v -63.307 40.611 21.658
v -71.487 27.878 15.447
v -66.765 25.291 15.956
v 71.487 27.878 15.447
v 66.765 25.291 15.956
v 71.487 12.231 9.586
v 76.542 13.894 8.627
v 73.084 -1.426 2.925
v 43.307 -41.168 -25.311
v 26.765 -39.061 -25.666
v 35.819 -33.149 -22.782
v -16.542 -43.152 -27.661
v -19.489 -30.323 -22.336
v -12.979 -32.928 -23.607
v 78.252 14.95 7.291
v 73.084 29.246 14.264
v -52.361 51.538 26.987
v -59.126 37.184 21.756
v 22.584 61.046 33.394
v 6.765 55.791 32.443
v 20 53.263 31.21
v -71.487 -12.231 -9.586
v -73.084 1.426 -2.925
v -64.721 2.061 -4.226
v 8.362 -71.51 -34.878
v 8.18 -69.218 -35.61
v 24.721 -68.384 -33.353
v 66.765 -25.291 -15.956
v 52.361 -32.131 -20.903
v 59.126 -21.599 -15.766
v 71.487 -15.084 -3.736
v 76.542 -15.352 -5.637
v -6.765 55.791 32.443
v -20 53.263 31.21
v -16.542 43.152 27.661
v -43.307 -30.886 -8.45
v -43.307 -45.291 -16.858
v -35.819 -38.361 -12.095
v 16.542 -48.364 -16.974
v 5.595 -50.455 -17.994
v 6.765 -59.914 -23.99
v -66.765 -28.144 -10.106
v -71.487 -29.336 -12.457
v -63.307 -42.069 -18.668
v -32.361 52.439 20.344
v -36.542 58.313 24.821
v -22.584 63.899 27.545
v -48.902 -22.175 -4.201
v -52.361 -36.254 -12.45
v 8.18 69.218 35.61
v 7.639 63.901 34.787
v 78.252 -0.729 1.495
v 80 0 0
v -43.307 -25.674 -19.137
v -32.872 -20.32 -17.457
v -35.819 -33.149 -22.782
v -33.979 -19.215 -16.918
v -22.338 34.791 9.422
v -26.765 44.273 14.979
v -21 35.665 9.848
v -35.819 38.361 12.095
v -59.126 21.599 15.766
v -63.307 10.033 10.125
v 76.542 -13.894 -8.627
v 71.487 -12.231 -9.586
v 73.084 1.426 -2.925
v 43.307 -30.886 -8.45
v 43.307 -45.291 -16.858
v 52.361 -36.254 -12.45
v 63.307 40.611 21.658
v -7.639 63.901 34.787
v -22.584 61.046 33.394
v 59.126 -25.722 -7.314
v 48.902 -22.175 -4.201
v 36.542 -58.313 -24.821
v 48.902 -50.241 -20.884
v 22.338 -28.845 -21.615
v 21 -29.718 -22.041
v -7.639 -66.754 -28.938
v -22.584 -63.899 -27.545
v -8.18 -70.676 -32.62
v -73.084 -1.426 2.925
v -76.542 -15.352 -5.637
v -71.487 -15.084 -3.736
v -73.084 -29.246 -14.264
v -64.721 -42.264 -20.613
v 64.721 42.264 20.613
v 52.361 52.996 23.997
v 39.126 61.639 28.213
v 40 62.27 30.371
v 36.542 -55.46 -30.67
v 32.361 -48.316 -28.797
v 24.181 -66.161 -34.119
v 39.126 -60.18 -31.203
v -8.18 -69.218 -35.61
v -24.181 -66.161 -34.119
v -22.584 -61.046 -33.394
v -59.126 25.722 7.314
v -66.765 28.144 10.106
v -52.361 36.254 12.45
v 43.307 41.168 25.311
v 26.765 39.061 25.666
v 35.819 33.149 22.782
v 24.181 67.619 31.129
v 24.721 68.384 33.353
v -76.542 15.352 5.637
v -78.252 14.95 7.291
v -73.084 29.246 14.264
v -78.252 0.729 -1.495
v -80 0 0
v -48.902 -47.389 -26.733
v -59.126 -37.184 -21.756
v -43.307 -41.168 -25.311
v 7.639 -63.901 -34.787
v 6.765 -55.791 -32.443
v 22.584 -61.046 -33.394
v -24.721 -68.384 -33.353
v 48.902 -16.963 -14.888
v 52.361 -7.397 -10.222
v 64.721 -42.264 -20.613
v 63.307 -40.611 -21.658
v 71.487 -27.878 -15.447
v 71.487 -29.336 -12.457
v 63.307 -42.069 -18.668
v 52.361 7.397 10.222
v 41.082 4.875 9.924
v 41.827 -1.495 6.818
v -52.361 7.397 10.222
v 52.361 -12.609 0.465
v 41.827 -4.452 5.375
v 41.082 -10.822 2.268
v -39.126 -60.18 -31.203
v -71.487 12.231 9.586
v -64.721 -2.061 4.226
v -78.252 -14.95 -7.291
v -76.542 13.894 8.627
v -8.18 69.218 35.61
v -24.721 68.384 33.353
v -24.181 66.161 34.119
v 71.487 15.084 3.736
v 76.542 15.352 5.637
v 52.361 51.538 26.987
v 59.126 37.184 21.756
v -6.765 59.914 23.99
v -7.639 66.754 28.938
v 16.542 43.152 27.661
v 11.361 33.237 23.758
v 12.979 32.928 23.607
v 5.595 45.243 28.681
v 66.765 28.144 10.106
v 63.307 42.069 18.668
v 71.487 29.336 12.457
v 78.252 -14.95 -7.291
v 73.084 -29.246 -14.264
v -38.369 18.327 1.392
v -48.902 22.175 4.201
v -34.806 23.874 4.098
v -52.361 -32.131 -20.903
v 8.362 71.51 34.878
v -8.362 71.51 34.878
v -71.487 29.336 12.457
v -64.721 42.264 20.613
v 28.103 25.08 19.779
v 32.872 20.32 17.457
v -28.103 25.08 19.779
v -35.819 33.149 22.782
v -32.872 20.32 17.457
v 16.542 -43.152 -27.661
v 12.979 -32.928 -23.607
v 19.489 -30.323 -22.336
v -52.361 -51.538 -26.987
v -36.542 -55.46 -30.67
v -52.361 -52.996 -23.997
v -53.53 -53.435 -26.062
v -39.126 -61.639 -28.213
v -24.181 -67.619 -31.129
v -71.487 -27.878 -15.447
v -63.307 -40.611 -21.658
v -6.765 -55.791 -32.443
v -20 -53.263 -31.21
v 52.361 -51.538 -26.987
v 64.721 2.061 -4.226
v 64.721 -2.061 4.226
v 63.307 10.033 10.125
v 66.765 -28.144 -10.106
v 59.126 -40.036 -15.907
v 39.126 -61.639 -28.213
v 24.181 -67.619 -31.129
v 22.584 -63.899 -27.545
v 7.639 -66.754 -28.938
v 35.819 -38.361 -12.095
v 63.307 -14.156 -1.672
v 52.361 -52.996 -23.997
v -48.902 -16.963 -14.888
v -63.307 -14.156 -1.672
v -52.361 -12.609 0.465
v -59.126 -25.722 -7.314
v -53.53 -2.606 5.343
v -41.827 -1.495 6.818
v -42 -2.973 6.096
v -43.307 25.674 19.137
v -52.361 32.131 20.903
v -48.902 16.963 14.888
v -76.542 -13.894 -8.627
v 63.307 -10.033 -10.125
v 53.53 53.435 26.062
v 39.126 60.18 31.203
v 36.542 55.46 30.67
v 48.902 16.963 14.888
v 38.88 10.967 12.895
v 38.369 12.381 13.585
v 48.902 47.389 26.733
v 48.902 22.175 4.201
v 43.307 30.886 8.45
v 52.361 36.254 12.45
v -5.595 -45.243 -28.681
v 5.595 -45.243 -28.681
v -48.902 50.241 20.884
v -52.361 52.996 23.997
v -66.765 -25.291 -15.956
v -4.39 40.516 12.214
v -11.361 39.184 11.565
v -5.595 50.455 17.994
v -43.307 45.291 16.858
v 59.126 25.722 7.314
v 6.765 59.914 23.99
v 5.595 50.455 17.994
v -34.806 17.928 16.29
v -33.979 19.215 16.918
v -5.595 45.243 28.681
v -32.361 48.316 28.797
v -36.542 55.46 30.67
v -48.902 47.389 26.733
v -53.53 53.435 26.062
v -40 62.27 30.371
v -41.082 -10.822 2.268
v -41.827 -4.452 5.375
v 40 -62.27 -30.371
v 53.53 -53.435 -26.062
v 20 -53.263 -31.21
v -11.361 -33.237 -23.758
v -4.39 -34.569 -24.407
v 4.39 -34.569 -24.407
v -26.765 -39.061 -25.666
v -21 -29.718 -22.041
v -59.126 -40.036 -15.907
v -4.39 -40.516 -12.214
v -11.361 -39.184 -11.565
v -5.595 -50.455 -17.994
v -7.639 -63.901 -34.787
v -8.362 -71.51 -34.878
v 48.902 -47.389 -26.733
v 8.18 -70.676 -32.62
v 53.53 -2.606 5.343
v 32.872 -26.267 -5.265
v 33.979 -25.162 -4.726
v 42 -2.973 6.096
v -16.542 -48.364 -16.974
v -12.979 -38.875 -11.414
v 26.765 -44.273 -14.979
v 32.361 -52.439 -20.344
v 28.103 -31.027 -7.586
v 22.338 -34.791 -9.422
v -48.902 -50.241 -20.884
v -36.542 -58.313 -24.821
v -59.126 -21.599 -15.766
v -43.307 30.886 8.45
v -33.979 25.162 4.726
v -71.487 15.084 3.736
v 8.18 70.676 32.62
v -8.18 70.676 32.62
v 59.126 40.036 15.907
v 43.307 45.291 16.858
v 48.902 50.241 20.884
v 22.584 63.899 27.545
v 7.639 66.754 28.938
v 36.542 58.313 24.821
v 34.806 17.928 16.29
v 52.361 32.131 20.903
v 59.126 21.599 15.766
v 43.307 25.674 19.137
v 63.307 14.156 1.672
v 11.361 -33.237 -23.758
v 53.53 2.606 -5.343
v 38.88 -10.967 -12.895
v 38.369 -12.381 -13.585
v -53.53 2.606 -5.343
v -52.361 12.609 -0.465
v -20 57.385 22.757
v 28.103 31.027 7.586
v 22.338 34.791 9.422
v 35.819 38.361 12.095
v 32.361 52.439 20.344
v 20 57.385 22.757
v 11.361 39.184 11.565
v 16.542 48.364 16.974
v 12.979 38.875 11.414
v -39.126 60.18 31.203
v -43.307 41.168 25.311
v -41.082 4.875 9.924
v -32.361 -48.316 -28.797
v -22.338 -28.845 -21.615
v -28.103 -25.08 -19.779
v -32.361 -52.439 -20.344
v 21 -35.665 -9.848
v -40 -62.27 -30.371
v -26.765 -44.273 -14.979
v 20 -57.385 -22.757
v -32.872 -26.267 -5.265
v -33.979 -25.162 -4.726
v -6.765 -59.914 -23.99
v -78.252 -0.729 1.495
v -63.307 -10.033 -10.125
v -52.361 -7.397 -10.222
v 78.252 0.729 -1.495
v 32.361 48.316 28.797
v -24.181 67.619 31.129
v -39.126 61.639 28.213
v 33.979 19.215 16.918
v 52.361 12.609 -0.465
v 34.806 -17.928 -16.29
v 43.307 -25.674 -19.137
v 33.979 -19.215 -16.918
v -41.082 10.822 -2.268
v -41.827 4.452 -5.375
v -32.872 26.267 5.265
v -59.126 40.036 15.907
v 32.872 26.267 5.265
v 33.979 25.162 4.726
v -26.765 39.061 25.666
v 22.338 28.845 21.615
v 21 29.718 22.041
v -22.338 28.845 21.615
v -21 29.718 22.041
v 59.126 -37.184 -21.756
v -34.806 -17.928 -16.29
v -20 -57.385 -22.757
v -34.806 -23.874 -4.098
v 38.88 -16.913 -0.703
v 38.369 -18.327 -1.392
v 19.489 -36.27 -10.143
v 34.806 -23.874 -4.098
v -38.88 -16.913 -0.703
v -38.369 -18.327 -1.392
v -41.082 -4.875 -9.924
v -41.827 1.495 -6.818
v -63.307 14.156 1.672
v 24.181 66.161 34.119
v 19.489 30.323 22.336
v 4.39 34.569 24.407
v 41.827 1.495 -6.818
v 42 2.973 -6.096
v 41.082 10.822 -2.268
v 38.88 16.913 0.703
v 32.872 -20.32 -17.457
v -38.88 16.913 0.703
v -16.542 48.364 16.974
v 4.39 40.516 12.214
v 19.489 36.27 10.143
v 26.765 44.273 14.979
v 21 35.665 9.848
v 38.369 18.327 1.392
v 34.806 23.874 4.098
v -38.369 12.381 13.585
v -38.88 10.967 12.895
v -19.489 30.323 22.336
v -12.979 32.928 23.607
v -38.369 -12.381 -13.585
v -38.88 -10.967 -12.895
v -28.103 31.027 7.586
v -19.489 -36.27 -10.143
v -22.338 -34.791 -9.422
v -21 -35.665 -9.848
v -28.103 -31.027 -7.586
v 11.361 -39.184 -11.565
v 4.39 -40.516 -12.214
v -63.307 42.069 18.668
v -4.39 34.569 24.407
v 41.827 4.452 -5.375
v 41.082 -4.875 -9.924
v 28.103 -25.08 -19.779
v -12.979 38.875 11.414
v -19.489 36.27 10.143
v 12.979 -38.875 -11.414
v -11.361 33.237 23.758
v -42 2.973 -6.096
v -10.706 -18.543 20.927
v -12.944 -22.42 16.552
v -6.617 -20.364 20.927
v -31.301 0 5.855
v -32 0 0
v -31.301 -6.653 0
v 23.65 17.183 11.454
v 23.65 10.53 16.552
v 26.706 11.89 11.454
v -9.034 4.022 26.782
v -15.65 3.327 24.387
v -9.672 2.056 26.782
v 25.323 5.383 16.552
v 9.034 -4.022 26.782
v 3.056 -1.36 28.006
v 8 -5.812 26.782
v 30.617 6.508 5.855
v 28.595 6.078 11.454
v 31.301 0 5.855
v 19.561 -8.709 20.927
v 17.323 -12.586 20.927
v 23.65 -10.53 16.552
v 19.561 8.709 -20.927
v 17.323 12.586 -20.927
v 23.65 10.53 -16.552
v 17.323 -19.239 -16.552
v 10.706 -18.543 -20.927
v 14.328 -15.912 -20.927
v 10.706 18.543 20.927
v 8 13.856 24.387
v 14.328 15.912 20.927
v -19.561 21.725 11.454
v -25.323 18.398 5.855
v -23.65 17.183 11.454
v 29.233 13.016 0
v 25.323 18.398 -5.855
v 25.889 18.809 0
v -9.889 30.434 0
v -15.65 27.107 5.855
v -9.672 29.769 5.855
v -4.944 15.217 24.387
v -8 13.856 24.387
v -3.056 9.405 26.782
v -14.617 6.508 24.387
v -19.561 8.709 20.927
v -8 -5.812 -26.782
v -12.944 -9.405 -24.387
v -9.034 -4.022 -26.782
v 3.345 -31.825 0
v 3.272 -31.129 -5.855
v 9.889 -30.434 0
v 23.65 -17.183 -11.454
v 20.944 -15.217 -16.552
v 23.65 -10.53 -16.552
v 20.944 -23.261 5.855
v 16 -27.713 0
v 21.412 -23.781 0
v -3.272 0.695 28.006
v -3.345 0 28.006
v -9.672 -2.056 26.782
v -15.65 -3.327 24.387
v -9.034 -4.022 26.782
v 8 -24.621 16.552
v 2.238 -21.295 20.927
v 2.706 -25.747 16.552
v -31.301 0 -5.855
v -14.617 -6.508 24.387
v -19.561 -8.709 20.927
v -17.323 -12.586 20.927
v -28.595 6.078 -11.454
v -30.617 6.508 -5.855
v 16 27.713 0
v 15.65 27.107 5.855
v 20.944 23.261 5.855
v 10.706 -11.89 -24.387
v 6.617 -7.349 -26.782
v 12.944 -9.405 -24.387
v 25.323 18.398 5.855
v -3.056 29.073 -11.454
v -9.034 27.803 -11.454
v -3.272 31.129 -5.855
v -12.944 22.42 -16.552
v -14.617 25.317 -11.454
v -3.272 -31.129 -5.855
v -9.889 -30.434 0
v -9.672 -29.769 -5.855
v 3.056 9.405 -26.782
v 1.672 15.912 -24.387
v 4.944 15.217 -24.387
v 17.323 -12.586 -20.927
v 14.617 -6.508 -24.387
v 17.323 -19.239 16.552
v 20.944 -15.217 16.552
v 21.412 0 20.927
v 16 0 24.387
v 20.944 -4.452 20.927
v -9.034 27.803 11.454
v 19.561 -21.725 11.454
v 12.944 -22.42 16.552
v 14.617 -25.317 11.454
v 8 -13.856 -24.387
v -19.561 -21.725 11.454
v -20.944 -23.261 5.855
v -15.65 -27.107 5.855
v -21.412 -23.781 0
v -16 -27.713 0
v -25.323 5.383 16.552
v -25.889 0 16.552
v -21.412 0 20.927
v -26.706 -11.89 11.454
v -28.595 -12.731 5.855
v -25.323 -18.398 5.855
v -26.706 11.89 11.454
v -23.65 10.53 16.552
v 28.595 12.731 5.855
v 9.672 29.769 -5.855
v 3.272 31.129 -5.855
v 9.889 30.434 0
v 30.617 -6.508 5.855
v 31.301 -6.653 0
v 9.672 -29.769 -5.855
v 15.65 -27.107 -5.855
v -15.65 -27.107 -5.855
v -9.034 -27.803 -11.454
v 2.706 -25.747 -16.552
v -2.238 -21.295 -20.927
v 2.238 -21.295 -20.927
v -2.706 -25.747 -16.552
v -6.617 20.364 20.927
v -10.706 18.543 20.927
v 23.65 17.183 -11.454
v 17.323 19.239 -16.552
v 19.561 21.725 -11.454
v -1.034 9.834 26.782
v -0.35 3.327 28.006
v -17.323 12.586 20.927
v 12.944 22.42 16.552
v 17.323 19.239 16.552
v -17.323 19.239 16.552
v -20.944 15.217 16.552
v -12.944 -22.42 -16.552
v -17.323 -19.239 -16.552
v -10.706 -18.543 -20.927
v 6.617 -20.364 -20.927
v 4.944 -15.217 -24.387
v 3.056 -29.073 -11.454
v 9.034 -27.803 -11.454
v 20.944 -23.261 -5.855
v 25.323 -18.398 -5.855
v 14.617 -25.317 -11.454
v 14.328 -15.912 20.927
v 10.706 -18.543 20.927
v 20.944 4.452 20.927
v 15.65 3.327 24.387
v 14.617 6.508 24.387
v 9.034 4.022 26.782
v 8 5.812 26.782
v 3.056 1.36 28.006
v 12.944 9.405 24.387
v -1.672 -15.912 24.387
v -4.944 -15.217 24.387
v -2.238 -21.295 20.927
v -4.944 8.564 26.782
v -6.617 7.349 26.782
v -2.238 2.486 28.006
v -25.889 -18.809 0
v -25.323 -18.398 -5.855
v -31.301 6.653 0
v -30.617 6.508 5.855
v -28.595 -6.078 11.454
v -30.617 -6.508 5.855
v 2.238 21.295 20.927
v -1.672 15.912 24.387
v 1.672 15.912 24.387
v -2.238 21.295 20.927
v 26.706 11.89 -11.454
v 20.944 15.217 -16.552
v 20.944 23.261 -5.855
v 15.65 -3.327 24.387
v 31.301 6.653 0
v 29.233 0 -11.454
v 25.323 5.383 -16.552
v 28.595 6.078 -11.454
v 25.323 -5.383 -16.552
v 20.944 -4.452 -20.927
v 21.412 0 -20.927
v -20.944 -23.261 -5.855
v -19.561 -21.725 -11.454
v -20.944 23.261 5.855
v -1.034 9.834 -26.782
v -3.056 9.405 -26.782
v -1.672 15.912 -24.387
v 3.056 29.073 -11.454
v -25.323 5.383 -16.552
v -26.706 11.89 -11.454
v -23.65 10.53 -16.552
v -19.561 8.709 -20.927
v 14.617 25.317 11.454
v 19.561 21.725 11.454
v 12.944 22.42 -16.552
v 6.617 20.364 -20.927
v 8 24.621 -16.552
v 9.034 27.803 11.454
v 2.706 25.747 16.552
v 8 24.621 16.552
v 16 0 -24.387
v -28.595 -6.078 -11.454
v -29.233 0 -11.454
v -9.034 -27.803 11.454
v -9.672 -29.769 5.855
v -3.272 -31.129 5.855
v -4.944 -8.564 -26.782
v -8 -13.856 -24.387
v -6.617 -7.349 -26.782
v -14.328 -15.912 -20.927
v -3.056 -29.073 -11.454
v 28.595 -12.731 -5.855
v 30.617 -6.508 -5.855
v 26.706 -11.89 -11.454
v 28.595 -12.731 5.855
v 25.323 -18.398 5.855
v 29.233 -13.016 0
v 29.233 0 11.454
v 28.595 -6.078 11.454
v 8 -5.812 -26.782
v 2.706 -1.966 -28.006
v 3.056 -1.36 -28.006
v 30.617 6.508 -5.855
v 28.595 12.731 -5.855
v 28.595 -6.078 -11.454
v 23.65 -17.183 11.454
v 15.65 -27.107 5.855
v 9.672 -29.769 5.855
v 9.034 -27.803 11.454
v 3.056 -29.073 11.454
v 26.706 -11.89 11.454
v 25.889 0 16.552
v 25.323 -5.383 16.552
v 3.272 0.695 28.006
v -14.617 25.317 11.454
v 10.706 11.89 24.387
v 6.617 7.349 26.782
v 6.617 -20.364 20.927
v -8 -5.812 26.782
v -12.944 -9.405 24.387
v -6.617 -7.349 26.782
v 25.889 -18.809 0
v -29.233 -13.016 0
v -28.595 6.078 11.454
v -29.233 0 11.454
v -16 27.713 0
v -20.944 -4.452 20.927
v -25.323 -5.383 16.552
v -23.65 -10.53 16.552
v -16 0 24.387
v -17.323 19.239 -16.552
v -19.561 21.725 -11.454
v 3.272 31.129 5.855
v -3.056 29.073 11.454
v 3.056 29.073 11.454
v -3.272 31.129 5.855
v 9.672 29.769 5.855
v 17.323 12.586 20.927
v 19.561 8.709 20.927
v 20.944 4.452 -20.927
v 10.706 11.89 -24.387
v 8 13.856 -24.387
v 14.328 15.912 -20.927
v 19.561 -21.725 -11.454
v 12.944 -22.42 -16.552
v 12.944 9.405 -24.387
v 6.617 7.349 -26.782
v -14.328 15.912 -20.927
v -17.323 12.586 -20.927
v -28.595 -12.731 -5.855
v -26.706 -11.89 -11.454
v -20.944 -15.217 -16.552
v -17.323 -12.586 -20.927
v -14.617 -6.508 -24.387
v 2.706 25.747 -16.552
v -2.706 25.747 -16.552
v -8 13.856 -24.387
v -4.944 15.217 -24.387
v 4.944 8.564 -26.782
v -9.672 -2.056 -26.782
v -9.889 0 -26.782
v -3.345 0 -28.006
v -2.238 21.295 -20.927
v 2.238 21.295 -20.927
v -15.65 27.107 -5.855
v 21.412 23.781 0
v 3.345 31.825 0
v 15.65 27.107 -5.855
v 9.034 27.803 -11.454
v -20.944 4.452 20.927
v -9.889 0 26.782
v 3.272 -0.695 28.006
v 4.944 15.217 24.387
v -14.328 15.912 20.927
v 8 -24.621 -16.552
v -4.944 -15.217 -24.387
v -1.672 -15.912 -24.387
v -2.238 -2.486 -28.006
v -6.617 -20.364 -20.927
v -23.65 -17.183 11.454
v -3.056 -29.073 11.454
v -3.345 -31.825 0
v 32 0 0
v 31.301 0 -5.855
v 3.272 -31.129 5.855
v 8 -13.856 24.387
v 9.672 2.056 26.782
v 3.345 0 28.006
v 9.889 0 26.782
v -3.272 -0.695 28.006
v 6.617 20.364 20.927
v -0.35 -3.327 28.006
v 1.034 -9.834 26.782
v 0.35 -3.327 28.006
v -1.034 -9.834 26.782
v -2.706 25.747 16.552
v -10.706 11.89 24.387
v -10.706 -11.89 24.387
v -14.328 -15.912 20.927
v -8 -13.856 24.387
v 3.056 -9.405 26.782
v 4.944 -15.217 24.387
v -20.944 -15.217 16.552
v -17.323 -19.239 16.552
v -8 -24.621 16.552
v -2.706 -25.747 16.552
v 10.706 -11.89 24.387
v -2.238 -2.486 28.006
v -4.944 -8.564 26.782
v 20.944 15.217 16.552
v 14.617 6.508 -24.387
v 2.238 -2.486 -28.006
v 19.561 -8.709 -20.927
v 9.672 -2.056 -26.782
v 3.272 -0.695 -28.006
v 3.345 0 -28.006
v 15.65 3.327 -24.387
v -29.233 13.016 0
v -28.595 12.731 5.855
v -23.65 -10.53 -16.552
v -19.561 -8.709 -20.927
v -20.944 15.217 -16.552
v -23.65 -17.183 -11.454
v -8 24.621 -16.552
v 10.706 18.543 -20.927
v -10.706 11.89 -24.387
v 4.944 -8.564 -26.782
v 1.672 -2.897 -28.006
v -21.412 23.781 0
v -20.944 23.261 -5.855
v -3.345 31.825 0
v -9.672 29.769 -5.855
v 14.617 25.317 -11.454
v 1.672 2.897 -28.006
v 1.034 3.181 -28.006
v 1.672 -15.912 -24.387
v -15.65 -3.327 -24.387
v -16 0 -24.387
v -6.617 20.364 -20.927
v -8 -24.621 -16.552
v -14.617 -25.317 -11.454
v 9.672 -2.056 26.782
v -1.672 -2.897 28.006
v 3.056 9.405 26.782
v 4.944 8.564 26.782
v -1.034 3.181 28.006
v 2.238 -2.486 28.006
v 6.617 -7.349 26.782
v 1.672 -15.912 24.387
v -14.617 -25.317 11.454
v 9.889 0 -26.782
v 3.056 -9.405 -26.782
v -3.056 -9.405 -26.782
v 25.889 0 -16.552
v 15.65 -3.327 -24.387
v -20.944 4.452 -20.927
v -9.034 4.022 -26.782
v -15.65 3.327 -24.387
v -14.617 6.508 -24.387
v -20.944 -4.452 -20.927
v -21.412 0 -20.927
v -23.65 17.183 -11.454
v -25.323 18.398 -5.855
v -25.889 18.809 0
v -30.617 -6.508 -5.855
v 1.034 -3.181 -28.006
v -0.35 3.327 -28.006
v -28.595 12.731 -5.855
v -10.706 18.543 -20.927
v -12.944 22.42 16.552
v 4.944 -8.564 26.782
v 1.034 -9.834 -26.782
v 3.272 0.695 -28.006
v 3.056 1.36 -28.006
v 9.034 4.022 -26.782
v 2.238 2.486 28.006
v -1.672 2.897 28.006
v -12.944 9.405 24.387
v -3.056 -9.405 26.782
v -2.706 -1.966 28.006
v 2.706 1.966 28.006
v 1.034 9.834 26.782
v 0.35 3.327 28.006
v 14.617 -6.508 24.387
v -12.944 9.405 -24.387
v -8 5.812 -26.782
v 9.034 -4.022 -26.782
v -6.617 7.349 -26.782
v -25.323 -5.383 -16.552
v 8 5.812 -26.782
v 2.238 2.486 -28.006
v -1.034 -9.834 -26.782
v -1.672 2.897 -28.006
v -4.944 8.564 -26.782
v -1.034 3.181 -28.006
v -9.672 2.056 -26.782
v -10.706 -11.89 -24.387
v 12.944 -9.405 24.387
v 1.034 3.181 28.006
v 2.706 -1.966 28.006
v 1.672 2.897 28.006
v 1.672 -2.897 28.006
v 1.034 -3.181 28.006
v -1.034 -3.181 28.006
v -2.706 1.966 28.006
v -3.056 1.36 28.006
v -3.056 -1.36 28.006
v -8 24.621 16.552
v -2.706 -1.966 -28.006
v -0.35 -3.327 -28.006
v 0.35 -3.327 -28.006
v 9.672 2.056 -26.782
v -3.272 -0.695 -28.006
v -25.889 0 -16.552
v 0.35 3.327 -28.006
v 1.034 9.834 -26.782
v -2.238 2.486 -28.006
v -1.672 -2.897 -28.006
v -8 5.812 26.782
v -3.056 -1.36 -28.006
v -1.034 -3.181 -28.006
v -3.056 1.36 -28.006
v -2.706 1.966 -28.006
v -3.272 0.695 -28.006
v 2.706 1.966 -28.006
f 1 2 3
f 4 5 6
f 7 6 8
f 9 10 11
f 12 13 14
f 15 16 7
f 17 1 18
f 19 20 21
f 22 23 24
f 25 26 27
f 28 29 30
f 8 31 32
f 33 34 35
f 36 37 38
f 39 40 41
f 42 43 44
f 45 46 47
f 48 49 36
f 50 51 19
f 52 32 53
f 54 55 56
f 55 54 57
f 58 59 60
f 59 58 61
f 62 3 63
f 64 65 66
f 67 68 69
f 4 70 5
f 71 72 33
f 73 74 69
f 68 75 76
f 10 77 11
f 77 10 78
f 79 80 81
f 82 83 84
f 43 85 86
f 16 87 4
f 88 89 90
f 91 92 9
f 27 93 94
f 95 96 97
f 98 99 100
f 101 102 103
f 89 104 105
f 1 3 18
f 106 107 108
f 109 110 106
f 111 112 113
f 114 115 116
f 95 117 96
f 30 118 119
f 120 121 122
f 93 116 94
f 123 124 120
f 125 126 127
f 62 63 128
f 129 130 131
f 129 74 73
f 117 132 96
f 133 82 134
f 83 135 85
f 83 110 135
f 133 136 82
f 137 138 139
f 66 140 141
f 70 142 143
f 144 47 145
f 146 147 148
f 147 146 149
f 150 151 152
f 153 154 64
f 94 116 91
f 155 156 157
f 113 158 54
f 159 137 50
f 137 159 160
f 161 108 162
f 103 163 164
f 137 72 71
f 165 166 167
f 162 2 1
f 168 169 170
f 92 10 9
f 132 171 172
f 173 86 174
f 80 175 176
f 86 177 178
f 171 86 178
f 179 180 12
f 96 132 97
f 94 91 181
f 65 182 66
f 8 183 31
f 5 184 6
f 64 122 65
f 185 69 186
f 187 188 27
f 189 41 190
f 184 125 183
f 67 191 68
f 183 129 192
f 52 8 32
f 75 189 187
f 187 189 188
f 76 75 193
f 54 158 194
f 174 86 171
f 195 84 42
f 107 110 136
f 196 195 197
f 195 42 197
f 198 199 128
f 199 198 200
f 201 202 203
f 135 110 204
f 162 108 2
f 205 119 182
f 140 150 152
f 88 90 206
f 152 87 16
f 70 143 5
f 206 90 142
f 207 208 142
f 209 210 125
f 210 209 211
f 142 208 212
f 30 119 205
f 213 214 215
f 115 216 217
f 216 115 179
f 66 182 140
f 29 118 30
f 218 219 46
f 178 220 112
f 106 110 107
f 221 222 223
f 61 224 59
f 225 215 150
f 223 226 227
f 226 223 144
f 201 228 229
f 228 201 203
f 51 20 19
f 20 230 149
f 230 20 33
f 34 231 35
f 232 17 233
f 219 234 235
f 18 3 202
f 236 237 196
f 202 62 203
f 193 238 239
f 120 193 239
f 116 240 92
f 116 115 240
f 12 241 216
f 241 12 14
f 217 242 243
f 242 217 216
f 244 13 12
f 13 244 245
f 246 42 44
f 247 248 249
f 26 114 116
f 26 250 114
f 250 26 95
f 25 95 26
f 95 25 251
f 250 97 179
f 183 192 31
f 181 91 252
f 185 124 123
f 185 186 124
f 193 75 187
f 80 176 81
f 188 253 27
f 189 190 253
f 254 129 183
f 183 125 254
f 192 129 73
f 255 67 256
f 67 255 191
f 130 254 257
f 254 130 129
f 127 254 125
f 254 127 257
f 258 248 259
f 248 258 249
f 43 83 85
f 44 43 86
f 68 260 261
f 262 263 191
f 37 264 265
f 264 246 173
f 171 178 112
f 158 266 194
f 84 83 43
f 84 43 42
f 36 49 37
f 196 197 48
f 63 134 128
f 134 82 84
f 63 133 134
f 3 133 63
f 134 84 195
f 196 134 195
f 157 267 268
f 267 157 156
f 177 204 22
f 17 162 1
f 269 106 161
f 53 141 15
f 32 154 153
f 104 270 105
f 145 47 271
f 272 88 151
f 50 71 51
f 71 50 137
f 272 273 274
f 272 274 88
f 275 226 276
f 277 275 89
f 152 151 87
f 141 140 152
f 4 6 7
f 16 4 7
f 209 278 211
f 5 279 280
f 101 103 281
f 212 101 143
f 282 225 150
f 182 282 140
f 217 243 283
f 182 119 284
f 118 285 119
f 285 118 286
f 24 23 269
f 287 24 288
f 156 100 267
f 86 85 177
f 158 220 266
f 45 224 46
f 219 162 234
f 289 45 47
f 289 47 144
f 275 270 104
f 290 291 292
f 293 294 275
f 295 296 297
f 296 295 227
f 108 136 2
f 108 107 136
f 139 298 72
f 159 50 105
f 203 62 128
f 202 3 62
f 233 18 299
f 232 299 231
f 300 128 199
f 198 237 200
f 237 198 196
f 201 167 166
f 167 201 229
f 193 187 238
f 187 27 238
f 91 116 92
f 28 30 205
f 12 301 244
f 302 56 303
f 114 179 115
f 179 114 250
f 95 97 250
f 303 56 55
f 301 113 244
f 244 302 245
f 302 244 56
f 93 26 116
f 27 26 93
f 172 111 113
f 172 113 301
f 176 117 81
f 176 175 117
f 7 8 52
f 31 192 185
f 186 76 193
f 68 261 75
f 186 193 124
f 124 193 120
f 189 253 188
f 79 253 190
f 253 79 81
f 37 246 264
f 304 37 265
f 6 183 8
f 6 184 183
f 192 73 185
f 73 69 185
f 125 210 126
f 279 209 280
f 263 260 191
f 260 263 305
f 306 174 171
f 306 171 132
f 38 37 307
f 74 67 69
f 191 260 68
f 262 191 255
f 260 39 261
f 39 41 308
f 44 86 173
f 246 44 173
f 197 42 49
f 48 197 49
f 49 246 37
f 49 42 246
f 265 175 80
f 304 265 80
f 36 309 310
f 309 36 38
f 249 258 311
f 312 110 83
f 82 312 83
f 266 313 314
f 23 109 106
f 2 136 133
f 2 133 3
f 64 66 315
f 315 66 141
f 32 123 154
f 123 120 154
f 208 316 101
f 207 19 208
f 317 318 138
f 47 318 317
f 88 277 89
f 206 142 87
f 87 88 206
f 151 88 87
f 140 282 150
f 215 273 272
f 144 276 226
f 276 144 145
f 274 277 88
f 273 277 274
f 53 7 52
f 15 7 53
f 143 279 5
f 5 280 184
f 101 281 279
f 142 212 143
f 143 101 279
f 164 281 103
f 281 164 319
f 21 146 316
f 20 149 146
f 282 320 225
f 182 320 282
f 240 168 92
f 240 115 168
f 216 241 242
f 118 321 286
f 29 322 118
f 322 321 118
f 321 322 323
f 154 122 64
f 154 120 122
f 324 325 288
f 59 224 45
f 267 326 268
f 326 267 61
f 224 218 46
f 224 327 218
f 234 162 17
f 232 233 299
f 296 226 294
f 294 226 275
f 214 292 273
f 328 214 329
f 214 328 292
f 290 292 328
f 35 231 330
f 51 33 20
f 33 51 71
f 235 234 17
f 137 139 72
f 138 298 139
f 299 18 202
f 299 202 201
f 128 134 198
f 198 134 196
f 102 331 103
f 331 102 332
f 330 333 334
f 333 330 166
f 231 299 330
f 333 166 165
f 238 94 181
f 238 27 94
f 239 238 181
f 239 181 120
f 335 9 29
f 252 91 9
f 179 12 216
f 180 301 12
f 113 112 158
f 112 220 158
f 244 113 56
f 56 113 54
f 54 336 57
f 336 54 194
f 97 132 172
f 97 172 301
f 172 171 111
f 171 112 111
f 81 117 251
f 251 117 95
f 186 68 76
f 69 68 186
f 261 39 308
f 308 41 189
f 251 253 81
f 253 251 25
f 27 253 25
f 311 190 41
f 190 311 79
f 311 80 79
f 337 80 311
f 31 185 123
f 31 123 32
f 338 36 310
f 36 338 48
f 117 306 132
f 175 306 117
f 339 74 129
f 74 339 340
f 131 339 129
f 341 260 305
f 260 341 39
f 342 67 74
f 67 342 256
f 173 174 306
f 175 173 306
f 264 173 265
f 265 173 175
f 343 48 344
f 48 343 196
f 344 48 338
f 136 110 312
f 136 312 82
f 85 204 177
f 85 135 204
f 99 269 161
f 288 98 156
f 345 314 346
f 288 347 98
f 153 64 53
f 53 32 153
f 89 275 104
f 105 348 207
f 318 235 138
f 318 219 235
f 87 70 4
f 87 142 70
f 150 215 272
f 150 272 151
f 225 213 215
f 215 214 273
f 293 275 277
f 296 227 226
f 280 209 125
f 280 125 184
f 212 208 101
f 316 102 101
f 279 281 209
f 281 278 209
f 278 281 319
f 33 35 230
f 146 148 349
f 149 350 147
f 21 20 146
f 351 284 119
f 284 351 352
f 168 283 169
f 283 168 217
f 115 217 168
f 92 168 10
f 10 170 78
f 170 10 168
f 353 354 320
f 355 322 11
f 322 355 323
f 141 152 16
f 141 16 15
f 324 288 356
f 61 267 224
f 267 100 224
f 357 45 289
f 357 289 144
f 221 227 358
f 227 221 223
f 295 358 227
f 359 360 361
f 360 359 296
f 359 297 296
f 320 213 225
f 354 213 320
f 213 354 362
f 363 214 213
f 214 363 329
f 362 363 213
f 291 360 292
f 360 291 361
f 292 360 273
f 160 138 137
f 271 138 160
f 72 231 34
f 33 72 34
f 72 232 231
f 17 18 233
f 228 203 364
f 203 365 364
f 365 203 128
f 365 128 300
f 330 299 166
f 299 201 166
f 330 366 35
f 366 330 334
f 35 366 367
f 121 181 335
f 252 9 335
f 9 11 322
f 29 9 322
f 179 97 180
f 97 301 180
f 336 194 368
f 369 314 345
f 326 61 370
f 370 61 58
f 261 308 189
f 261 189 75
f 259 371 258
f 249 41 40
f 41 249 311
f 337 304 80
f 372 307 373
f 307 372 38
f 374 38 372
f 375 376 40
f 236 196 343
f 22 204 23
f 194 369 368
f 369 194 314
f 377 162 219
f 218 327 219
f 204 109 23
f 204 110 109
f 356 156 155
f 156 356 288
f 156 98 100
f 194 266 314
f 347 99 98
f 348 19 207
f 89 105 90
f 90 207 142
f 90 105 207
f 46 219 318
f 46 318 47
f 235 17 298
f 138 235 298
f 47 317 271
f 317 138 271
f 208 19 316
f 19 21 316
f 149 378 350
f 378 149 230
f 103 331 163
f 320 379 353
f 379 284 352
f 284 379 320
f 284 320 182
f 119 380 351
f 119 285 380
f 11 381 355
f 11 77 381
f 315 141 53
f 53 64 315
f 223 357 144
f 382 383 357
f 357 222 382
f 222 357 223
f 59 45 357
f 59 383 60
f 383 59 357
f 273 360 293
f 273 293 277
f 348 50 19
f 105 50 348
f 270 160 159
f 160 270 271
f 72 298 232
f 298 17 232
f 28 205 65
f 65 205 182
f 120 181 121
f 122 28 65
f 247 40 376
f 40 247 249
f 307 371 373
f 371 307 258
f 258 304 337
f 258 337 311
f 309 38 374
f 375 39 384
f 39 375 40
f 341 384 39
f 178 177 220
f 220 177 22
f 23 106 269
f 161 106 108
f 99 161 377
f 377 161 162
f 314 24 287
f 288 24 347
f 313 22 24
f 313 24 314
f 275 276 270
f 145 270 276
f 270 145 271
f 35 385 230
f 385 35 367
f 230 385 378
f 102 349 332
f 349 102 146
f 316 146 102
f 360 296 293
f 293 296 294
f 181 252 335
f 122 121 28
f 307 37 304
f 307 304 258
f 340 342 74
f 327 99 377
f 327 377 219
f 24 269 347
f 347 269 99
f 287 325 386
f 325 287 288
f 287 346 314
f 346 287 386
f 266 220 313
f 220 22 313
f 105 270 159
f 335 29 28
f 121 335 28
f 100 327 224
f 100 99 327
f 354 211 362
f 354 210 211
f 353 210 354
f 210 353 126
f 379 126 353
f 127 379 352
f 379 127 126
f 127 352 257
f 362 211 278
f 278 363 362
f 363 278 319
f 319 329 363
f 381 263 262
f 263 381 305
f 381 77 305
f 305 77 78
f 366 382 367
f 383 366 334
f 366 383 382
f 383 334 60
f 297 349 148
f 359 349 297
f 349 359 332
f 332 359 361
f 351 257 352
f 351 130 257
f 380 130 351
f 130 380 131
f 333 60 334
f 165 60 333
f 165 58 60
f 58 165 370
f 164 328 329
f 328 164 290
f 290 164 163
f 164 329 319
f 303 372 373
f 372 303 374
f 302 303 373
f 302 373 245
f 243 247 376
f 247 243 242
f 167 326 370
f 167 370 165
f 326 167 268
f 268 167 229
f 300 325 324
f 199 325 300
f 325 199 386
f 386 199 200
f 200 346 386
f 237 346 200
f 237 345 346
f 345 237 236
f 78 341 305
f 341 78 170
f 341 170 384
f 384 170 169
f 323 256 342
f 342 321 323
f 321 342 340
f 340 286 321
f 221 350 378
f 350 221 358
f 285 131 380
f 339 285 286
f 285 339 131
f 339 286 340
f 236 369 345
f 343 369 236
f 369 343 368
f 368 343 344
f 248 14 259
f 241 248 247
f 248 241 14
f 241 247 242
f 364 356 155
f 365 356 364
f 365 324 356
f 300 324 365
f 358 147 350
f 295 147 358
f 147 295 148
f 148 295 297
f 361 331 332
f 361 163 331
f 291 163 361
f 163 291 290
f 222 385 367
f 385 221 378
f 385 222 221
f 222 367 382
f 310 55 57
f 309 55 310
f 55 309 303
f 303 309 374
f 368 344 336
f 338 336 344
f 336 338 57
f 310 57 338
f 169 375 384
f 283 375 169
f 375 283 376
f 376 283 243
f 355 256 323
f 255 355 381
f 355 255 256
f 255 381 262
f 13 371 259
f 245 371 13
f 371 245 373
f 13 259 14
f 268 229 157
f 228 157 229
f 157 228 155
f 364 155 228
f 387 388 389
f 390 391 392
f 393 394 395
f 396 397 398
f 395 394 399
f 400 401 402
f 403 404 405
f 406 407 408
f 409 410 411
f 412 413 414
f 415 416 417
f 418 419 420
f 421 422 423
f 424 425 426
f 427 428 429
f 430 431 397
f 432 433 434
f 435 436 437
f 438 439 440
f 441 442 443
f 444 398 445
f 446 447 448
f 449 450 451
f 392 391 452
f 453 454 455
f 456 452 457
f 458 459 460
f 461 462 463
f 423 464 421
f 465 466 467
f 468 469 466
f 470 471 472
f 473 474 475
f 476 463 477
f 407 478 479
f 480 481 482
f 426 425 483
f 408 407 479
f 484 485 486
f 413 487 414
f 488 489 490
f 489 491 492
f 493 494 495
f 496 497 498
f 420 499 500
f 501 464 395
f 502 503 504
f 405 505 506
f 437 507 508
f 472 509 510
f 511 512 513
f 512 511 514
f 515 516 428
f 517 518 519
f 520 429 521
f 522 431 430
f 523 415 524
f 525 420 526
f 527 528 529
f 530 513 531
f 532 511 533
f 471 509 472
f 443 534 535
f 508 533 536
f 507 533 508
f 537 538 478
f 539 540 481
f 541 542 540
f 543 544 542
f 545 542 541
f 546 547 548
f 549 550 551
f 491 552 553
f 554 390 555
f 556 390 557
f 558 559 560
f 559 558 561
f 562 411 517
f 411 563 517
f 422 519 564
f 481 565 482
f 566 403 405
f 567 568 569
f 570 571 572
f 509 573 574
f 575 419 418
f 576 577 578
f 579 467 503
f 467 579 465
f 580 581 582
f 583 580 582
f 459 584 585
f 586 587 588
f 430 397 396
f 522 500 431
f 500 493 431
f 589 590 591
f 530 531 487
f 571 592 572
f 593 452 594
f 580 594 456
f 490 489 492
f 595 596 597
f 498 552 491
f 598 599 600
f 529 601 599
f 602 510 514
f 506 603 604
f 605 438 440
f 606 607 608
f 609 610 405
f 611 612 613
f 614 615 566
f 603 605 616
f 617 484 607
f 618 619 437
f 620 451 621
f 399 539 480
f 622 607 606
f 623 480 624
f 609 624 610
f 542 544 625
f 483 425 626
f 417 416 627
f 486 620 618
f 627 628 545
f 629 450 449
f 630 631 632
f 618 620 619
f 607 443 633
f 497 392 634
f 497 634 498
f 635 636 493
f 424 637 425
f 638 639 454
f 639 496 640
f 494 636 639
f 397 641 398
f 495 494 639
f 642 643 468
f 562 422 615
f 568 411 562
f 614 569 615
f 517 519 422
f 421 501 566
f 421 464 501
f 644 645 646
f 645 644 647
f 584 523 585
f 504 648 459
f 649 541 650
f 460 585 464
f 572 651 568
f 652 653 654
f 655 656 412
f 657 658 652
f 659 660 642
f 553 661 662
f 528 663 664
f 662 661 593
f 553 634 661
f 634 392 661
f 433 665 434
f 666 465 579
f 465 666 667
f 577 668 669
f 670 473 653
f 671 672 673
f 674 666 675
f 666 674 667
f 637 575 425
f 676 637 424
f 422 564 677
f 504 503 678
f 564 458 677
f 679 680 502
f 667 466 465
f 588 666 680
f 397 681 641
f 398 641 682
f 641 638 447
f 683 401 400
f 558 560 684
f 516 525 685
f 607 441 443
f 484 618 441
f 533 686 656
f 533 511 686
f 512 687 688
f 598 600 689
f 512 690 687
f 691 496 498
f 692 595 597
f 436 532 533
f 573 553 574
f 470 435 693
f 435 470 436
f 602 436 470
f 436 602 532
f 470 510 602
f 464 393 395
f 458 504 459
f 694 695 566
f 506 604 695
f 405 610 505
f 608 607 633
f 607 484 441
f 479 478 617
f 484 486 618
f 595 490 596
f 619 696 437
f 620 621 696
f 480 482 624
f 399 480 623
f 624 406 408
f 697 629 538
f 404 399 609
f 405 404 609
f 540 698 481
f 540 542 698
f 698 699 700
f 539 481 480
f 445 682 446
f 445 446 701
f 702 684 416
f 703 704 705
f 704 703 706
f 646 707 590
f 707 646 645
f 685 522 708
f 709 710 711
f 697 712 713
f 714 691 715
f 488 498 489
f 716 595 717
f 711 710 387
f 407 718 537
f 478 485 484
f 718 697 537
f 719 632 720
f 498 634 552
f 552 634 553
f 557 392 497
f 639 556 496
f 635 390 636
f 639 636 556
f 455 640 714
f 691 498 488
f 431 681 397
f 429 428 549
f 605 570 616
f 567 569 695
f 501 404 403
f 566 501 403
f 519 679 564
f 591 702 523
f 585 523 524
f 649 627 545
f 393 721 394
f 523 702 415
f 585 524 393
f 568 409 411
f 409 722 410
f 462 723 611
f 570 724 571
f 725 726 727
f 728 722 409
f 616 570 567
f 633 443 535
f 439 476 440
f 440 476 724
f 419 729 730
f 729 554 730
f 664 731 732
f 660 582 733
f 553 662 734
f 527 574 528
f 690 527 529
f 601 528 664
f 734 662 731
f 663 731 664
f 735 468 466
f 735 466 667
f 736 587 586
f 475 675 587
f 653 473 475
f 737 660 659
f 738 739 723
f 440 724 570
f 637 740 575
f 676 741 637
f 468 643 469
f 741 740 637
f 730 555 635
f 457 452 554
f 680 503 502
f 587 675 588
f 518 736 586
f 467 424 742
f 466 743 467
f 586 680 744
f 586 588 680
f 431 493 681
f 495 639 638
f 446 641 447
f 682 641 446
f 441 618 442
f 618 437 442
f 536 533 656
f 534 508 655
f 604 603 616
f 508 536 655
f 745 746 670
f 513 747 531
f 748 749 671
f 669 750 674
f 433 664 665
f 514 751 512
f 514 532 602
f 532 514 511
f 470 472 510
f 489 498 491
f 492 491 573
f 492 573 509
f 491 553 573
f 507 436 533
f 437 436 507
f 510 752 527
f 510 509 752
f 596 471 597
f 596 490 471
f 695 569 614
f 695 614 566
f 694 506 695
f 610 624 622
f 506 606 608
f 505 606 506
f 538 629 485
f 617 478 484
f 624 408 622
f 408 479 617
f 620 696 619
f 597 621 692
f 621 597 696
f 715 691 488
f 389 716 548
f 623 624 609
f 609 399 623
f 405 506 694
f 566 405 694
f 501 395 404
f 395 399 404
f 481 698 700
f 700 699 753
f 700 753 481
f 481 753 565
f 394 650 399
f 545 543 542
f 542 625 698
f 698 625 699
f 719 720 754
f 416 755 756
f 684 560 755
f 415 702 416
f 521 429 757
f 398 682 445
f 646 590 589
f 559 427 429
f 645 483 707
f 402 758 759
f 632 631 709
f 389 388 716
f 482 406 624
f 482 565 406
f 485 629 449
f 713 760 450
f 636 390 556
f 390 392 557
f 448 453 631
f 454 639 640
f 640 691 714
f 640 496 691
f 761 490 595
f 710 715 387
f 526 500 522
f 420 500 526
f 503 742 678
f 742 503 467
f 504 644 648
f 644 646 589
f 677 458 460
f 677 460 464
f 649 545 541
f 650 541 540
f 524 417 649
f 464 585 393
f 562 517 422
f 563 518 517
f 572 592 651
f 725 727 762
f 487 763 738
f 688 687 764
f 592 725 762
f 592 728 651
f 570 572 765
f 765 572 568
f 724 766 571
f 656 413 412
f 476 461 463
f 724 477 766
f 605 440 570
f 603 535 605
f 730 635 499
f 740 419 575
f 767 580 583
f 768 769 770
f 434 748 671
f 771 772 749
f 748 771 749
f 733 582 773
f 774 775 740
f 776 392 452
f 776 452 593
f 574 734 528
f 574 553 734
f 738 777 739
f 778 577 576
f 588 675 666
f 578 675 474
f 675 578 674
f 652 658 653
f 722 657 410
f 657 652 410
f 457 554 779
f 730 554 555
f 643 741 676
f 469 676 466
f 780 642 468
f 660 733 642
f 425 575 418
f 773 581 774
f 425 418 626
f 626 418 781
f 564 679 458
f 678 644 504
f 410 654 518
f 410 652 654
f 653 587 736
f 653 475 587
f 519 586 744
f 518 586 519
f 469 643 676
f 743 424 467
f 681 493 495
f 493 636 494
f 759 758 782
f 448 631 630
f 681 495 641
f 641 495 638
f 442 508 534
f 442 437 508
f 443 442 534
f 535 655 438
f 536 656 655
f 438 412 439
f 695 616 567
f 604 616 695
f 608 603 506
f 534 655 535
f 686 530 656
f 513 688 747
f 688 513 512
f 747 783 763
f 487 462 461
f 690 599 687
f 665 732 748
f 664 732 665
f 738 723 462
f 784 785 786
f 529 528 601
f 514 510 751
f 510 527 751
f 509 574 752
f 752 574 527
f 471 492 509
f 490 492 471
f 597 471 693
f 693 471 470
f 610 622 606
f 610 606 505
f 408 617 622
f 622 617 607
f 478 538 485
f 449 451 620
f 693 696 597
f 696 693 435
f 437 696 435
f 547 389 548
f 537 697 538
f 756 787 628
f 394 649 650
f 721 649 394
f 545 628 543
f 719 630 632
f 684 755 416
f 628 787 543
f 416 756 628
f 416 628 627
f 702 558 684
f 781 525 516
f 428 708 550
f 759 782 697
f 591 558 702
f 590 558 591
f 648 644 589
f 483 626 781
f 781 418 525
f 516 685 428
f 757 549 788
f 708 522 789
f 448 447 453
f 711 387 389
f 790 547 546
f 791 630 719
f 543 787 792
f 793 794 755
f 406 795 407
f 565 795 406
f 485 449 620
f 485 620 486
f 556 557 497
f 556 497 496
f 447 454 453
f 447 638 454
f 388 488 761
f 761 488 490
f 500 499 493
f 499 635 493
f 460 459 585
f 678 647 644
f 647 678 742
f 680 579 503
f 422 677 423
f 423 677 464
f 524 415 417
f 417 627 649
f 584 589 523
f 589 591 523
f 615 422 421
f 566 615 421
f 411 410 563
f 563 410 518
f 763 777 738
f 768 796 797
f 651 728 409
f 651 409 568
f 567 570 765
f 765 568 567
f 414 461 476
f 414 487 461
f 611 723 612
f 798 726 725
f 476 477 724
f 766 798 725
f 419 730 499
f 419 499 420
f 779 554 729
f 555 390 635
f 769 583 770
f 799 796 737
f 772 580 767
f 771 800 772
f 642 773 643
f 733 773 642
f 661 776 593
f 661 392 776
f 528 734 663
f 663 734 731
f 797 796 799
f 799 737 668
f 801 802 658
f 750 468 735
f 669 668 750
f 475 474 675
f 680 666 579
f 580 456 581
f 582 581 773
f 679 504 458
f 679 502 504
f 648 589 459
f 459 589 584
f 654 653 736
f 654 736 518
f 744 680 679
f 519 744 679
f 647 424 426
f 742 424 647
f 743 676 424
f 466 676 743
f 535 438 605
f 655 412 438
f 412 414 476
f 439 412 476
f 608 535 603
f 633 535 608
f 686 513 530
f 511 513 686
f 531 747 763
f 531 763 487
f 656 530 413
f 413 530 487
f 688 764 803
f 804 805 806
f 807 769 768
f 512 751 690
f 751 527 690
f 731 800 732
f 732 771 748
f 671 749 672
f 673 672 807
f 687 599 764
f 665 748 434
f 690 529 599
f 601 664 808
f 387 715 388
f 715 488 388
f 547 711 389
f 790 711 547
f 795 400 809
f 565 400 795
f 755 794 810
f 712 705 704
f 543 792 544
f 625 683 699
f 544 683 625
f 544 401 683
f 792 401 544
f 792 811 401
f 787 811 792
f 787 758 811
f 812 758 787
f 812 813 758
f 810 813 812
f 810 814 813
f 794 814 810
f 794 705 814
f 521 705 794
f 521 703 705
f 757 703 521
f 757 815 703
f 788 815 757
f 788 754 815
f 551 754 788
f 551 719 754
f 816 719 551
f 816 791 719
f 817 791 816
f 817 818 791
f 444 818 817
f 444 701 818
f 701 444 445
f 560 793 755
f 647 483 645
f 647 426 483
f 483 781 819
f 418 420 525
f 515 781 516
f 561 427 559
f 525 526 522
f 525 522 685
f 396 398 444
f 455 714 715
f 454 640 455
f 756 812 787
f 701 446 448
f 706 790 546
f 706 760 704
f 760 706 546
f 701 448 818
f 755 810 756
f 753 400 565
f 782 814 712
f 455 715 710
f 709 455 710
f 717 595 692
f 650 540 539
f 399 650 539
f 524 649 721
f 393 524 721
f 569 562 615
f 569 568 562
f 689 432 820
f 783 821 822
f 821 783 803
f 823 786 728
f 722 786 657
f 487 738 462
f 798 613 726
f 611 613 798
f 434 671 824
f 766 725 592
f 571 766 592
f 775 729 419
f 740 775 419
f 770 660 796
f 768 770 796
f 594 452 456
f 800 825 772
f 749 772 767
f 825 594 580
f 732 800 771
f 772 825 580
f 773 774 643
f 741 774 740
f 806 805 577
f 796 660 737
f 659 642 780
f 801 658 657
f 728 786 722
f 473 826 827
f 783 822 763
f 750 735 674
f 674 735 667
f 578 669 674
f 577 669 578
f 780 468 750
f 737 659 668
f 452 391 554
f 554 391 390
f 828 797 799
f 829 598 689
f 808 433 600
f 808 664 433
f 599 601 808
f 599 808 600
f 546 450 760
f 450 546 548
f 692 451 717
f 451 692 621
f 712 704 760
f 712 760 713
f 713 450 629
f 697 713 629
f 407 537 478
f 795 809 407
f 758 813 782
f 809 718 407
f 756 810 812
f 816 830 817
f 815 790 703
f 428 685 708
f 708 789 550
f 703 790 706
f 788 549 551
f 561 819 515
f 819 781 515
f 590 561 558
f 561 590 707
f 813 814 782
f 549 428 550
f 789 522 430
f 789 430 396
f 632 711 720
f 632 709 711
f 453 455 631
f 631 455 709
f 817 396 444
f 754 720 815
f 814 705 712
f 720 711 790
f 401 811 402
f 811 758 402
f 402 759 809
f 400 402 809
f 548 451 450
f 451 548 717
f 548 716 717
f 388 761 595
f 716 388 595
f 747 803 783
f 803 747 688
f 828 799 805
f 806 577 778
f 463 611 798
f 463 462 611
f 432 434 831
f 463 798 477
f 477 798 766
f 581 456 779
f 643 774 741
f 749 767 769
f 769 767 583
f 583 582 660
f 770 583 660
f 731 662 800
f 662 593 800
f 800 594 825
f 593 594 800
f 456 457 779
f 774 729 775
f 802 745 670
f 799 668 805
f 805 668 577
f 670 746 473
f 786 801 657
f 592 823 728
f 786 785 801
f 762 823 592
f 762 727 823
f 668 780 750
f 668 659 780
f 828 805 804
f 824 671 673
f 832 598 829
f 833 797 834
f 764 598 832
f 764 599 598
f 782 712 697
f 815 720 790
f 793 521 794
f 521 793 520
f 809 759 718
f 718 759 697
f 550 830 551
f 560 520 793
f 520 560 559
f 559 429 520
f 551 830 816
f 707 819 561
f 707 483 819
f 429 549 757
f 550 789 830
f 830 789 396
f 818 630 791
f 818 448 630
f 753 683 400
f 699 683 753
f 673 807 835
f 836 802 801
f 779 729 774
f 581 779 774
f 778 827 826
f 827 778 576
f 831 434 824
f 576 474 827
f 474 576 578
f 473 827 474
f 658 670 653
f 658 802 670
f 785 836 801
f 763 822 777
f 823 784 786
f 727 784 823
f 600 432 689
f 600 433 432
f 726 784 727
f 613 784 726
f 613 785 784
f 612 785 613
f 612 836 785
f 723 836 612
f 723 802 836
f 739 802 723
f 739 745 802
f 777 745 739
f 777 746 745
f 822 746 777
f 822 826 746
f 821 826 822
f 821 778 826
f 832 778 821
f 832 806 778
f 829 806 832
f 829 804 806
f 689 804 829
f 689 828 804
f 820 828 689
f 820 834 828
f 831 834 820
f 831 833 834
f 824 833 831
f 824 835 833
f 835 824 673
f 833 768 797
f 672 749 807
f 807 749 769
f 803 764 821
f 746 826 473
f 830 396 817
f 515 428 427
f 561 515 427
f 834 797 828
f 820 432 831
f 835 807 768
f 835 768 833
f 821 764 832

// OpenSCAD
// 3DScad sample: Saturn-like ringed planet
// Uses only the currently round-trippable subset.

module scene_model() {
    planet_r = 32;
    ring_r = 80;
    ring_gap = 10;
    ring_tilt = 26;

    union() {
        scale([1, 1, 0.88]) {
            sphere(r=planet_r);
        }
        rotate([ring_tilt, 0, 0]) {
            difference() {
                scale([1, 1, 0.1]) {
                    sphere(r=ring_r);
                }
                cylinder(h=ring_r, r=planet_r + ring_gap, center=true);
            }
        }
        rotate([ring_tilt, 0, 0]) {
            difference() {
                scale([1, 1, 0.07]) {
                    sphere(r=ring_r - 14);
                }
                cylinder(h=ring_r, r=planet_r + ring_gap + 4, center=true);
            }
        }
    }
}

scene_model();
